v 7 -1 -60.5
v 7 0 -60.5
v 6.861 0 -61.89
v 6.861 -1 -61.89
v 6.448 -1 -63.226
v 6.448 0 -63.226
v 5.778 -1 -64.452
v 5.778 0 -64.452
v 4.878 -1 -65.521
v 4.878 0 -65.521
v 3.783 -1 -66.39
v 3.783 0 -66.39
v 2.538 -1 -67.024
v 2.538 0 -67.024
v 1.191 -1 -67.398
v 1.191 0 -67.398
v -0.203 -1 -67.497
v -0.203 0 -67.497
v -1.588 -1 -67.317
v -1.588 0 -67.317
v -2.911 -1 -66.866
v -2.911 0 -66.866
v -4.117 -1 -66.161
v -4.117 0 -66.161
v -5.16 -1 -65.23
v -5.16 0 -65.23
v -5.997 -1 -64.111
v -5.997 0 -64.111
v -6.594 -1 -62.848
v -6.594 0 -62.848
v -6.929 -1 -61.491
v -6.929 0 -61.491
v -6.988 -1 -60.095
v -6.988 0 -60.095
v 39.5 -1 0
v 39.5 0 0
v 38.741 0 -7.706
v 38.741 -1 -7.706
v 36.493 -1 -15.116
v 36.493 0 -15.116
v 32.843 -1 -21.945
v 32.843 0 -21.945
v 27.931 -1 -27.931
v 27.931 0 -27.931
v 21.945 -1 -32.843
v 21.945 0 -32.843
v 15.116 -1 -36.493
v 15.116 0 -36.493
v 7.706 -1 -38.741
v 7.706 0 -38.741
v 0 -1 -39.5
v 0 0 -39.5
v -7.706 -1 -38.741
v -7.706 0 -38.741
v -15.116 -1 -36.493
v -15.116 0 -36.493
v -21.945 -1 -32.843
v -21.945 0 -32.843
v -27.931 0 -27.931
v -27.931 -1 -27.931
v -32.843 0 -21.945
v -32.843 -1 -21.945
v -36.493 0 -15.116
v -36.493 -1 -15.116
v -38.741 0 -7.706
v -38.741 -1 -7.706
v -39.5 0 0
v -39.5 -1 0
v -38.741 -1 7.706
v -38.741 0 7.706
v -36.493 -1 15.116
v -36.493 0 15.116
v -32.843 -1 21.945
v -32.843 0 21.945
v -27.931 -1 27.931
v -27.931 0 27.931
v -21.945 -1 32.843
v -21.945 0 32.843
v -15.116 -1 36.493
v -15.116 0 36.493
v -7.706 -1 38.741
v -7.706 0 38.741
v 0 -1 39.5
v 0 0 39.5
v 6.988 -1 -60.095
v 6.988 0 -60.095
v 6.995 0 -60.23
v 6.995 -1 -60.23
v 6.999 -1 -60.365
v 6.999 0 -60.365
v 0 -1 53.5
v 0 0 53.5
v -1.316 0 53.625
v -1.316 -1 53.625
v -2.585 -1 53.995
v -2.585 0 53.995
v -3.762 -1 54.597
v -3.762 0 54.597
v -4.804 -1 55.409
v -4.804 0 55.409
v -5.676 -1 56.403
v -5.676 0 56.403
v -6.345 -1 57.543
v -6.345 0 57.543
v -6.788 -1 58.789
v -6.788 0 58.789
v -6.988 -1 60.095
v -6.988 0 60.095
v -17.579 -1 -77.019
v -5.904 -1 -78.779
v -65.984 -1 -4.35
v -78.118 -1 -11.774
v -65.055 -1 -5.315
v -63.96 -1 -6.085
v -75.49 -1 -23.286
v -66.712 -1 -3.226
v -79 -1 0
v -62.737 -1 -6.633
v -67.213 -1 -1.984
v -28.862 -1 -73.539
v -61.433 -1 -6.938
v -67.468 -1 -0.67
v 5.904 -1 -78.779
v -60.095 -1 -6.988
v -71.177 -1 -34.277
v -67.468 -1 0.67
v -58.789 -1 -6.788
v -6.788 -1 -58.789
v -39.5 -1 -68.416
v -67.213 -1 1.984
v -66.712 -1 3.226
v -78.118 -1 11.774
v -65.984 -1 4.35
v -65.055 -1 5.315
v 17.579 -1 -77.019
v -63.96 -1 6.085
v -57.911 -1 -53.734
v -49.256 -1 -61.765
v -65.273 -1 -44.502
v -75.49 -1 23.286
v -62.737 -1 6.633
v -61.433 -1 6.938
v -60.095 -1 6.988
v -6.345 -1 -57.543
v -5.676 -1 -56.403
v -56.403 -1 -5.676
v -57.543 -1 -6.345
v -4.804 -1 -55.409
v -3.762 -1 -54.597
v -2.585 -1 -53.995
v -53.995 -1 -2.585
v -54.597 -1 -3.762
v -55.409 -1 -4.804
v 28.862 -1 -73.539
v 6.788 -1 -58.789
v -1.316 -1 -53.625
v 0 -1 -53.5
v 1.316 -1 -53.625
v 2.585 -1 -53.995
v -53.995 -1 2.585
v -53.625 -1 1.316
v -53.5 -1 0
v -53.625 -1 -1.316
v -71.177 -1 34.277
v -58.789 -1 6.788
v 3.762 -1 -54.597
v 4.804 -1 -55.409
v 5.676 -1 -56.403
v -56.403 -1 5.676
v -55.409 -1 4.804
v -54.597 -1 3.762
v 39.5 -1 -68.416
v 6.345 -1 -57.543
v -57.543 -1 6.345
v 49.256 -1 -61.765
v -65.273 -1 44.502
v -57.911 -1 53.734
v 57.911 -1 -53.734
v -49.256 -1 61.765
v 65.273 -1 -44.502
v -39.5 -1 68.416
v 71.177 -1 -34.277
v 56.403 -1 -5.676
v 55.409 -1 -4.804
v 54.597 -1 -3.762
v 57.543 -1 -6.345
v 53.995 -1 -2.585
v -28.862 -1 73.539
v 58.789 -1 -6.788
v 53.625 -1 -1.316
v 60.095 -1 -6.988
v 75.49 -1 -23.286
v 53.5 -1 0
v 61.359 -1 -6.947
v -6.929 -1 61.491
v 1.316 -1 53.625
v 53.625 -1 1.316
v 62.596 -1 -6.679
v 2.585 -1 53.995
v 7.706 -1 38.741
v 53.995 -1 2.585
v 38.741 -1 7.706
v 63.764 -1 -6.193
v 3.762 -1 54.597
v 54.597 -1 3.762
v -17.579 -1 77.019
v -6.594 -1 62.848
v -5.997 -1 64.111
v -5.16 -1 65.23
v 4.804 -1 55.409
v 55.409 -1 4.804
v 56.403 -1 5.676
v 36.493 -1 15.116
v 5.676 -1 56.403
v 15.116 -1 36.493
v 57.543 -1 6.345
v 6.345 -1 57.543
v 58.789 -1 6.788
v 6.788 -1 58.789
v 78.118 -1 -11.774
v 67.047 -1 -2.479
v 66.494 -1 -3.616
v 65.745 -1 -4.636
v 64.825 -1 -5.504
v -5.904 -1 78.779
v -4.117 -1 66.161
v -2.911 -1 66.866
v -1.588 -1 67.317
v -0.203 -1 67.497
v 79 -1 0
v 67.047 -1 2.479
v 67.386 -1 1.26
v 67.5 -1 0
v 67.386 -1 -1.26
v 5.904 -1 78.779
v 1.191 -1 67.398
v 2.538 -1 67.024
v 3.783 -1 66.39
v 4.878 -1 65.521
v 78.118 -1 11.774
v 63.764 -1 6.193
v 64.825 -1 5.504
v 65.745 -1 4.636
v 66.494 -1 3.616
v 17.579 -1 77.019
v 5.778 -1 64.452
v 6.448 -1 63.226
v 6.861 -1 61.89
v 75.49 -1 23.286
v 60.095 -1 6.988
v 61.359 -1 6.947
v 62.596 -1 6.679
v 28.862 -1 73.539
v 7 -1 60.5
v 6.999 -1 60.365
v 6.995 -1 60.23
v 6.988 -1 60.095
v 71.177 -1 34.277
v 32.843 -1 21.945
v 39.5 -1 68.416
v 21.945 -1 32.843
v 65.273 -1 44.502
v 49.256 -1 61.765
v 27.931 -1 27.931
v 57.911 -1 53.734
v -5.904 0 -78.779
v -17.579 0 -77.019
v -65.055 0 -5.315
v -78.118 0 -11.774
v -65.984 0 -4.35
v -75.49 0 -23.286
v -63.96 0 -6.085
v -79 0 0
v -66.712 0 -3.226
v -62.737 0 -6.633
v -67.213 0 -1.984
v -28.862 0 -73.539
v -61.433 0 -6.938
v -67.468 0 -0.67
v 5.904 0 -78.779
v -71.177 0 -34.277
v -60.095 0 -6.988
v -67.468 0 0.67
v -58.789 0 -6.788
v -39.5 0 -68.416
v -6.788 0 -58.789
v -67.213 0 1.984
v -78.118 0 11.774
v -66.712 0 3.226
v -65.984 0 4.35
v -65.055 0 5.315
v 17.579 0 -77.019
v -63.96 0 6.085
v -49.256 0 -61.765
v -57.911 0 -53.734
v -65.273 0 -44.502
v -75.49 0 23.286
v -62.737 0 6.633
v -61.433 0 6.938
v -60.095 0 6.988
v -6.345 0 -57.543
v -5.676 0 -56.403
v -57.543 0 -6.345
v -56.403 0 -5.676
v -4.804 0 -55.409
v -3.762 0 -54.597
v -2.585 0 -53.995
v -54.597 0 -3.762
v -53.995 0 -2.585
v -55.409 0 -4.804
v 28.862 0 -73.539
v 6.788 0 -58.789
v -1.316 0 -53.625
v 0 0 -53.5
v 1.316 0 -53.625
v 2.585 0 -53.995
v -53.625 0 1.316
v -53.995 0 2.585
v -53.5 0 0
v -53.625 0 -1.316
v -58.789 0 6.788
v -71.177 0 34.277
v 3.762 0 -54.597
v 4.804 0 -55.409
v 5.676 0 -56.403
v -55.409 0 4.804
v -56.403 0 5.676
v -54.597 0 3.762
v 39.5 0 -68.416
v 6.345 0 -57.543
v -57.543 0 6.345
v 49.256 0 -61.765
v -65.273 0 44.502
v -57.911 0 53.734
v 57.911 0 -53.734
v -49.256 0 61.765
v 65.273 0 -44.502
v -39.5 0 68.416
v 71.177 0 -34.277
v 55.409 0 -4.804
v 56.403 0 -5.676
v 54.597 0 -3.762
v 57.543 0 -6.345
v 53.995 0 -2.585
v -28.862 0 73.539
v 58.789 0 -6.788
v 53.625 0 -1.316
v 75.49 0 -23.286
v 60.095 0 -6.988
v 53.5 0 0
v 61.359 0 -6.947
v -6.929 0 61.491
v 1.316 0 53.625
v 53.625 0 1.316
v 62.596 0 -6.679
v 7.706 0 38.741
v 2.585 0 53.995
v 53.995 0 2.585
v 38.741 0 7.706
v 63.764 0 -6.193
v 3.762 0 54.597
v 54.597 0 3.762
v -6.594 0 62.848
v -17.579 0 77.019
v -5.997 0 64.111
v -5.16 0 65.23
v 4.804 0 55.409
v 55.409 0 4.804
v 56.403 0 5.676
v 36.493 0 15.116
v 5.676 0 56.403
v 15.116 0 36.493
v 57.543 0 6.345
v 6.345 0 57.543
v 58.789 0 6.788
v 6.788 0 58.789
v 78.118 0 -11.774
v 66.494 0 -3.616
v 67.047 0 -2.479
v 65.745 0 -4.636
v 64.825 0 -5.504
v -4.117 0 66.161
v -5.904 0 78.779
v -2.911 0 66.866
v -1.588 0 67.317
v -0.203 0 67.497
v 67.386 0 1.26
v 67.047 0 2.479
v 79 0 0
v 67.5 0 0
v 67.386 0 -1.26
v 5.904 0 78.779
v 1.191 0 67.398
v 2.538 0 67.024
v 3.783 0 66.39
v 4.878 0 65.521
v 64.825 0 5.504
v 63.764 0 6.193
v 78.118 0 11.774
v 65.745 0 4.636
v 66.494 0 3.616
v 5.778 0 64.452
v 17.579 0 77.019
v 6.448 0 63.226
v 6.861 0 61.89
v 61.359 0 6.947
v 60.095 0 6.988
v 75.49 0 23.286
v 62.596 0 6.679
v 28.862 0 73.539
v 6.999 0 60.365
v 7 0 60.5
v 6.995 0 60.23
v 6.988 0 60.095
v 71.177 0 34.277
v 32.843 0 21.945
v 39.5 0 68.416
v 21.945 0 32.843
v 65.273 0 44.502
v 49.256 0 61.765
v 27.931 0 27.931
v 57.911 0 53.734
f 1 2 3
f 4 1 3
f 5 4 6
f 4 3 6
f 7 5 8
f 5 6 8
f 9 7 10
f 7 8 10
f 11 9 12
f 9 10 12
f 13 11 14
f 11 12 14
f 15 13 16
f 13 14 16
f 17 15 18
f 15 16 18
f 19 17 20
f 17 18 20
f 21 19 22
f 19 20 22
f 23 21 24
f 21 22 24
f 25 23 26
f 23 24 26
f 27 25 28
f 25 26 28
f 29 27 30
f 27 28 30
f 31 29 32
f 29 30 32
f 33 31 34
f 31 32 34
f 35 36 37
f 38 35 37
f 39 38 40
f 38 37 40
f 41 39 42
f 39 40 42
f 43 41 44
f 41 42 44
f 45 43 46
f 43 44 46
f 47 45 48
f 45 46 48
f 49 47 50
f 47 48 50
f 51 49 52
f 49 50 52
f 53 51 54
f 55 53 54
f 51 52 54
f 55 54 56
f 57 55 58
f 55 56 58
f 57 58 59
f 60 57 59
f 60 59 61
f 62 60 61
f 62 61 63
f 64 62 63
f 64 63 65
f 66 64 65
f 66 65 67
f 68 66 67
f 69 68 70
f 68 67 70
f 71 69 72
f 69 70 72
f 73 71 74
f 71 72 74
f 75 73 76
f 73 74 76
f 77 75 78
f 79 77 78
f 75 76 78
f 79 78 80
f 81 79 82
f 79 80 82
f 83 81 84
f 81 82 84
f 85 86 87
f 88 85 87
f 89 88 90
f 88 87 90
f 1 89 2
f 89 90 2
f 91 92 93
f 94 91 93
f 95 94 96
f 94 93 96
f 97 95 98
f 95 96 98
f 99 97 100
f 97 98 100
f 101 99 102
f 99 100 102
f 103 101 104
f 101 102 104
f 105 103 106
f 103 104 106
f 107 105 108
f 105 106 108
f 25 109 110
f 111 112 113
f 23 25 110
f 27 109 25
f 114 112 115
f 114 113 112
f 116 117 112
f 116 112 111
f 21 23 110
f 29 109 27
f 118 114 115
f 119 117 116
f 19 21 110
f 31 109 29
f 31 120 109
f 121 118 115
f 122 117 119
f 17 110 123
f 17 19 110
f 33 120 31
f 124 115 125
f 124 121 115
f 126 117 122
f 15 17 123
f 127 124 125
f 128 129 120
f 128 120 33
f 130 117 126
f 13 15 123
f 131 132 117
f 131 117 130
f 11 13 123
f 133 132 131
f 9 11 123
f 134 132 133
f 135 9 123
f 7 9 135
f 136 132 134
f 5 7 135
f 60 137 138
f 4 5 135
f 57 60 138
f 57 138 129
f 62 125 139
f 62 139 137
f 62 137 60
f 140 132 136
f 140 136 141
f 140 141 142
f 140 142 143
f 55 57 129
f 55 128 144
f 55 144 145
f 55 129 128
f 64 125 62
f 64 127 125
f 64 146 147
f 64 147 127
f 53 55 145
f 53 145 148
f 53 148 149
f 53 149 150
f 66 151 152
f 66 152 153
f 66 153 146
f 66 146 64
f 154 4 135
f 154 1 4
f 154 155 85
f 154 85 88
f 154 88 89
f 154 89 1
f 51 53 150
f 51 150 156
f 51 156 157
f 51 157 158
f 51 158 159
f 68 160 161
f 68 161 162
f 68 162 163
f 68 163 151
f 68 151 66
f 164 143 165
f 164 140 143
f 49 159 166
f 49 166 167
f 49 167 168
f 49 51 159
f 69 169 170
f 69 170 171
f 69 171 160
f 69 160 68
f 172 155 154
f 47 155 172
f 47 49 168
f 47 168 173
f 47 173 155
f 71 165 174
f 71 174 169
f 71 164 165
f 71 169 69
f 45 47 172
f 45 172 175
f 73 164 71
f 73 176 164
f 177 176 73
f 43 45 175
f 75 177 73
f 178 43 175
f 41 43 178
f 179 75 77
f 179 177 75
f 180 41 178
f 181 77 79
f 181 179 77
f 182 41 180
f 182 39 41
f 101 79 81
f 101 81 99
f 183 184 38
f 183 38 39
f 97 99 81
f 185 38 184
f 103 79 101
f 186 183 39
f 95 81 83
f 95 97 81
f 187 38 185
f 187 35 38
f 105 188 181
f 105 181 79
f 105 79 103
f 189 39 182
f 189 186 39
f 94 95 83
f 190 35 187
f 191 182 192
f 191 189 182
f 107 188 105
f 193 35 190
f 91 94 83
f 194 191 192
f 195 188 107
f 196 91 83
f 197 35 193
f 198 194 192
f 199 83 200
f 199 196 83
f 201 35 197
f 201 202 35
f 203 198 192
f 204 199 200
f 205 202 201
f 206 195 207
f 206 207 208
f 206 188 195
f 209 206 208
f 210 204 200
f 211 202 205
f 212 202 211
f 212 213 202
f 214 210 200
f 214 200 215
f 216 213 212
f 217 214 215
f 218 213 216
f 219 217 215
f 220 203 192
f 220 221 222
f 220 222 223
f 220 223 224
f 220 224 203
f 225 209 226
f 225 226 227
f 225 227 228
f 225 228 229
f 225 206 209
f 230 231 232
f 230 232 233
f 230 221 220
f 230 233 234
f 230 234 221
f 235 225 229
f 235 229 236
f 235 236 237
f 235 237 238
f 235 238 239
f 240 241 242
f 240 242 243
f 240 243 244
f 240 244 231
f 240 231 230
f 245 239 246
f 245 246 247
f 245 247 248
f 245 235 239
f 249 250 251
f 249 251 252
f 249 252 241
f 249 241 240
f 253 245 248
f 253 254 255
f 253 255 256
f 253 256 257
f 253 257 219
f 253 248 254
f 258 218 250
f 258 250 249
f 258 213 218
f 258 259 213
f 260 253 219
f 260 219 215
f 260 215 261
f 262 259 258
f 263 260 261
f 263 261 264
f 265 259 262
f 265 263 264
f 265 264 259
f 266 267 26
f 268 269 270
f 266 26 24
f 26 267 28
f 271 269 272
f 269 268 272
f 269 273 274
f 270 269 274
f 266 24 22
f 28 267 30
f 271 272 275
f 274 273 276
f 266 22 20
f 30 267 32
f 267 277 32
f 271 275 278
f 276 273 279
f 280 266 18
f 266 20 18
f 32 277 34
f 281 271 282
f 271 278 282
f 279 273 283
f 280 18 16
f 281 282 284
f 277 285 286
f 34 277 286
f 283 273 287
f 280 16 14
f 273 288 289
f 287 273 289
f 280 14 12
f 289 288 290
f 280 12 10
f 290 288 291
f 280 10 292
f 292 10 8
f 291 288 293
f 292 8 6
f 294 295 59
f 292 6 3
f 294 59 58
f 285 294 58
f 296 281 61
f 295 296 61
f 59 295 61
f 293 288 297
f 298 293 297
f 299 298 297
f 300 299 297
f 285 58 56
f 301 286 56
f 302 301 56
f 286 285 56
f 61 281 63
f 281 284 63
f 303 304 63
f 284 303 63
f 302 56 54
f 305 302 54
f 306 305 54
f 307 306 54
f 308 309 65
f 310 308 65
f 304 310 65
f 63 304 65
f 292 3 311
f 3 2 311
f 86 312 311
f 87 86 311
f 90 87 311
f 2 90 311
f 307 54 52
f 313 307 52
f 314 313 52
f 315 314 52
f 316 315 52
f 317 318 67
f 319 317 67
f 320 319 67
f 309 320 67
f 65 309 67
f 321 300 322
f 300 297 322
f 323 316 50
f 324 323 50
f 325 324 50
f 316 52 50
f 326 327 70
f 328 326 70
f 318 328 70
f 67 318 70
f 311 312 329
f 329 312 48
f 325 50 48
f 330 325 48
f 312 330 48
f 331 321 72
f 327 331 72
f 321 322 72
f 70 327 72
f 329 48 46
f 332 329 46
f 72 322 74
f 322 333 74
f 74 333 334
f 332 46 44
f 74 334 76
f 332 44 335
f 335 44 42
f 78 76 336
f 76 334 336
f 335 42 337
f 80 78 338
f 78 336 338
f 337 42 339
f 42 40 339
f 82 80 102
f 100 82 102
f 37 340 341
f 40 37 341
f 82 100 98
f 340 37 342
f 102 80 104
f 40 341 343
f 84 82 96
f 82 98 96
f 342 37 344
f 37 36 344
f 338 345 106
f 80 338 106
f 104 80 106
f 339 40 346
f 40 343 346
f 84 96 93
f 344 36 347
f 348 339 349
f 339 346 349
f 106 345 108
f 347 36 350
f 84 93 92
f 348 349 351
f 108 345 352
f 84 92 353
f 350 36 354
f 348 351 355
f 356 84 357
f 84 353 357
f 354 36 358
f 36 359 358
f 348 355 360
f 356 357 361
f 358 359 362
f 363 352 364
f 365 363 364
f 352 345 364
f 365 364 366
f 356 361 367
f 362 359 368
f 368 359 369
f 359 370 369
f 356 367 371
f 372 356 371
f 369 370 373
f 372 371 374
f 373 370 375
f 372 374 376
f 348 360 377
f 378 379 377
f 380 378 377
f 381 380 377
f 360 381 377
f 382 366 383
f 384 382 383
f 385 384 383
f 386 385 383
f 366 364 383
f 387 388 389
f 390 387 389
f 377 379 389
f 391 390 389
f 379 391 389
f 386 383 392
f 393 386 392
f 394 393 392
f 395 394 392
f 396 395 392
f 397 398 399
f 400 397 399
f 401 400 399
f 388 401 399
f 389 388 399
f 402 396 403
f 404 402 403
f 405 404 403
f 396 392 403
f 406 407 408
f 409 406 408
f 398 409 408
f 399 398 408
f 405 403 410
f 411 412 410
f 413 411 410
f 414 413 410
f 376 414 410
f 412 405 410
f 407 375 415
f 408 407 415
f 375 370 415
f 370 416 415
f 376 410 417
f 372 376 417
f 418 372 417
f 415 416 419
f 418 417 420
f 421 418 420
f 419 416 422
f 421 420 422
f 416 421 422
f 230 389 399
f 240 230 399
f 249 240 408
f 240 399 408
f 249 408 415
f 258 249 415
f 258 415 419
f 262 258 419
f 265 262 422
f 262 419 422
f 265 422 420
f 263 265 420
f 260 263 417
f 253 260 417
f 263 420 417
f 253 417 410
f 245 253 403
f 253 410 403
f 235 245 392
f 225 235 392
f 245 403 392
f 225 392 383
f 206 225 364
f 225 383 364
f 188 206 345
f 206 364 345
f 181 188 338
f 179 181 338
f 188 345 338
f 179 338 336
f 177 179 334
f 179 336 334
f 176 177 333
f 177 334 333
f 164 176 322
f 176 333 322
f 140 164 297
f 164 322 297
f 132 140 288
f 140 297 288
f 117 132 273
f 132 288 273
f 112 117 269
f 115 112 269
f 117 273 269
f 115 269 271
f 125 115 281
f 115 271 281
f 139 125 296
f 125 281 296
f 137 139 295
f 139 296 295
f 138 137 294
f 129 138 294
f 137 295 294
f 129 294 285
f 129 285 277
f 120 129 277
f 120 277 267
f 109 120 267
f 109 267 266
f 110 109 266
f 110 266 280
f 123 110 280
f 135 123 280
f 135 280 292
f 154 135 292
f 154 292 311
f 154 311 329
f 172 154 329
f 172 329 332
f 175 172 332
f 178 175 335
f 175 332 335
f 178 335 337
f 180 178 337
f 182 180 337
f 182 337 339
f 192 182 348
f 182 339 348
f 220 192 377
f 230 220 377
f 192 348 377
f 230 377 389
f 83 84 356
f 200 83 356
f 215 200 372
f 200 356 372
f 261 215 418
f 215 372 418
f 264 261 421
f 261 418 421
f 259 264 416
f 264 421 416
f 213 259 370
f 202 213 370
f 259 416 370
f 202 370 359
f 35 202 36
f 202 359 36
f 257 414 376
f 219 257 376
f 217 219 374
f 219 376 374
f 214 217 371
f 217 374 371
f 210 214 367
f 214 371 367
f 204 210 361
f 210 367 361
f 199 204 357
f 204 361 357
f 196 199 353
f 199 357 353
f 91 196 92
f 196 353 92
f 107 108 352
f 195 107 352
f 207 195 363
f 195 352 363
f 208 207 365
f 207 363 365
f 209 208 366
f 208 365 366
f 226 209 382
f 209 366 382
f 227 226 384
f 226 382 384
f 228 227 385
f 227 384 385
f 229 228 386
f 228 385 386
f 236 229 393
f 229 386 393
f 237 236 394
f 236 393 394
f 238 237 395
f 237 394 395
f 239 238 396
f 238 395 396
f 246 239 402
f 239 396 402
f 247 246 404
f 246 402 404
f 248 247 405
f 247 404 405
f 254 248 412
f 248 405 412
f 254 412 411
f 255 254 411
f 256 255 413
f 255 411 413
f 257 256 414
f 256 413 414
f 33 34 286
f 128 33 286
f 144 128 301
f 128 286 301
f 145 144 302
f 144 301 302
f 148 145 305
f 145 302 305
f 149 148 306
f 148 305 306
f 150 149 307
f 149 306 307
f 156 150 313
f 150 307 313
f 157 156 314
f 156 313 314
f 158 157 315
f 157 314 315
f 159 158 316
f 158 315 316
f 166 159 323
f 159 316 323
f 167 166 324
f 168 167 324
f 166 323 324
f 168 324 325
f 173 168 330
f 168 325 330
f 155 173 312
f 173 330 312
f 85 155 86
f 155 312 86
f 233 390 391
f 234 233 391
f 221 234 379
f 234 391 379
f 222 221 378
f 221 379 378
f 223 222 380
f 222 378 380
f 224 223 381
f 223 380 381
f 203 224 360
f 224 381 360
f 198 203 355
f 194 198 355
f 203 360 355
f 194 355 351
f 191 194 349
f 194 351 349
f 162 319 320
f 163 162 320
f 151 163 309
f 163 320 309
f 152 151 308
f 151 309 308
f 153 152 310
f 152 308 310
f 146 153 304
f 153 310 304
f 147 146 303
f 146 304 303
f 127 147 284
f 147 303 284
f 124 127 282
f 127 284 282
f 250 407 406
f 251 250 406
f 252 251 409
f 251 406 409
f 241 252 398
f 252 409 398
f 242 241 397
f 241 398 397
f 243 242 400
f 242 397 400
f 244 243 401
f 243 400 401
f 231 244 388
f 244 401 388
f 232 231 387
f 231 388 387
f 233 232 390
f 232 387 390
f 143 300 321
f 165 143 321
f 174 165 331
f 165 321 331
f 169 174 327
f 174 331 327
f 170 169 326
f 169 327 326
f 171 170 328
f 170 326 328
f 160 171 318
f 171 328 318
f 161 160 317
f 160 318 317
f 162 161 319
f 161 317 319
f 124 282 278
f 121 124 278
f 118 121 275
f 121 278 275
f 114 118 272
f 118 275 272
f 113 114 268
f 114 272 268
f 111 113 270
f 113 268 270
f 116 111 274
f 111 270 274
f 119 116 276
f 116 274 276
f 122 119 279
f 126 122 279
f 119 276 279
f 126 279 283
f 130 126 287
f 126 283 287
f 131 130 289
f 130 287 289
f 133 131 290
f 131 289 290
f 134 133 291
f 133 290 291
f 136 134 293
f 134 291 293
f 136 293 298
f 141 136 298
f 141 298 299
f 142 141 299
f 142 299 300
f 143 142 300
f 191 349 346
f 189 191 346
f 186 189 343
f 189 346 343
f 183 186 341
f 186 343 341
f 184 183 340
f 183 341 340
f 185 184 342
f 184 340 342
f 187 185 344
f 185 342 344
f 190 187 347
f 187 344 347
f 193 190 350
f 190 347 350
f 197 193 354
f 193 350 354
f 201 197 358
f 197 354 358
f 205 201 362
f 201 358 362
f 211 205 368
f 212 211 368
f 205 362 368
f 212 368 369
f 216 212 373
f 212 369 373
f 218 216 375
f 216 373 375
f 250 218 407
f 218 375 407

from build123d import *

# Parameters (mm, degrees)
F0_R     = 79
F1_DEPTH = 1


with BuildPart() as f1:
    # F0 (on Front) → F1 (new body)
    with BuildSketch(Plane.XZ):
        Circle(F0_R)
        with BuildLine():
            ThreePointArc((6.9882765021, 60.0950413223), (42.7799602618, 42.7799602618), (60.0950413223, 6.9882765021))
            ThreePointArc((60.0950413223, 6.9882765021), (65.3044400952, 5.0909090909), (67.5, 0))
            ThreePointArc((67.5, 0), (65.3044400952, -5.0909090909), (60.0950413223, -6.9882765021))
            ThreePointArc((60.0950413223, -6.9882765021), (42.7799602618, -42.7799602618), (6.9882765021, -60.0950413223))
            ThreePointArc((6.9882765021, -60.0950413223), (6.9970685117, -60.2974358305), (7, -60.5))
            ThreePointArc((7, -60.5), (-0.2025641695, -67.4970685117), (-6.9882765021, -60.0950413223))
            ThreePointArc((-6.9882765021, -60.0950413223), (-42.7799602618, -42.7799602618), (-60.0950413223, -6.9882765021))
            ThreePointArc((-60.0950413223, -6.9882765021), (-67.5, 0), (-60.0950413223, 6.9882765021))
            ThreePointArc((-60.0950413223, 6.9882765021), (-42.7799602618, 42.7799602618), (-6.9882765021, 60.0950413223))
            ThreePointArc((-6.9882765021, 60.0950413223), (-0.2025641695, 67.4970685117), (7, 60.5))
            ThreePointArc((7, 60.5), (6.9970685117, 60.2974358305), (6.9882765021, 60.0950413223))
        make_face(mode=Mode.SUBTRACT)
        with BuildLine():
            ThreePointArc((60.0950413223, -6.9882765021), (53.5, 0), (60.0950413223, 6.9882765021))
            ThreePointArc((60.0950413223, 6.9882765021), (42.7799602618, 42.7799602618), (6.9882765021, 60.0950413223))
            ThreePointArc((6.9882765021, 60.0950413223), (4.8044400952, 55.4090909091), (0, 53.5))
            ThreePointArc((0, 53.5), (-4.8044400952, 55.4090909091), (-6.9882765021, 60.0950413223))
            ThreePointArc((-6.9882765021, 60.0950413223), (-42.7799602618, 42.7799602618), (-60.0950413223, 6.9882765021))
            ThreePointArc((-60.0950413223, 6.9882765021), (-55.4090909091, 4.8044400952), (-53.5, 0))
            ThreePointArc((-53.5, 0), (-55.4090909091, -4.8044400952), (-60.0950413223, -6.9882765021))
            ThreePointArc((-60.0950413223, -6.9882765021), (-42.7799602618, -42.7799602618), (-6.9882765021, -60.0950413223))
            ThreePointArc((-6.9882765021, -60.0950413223), (0, -53.5), (6.9882765021, -60.0950413223))
            ThreePointArc((6.9882765021, -60.0950413223), (42.7799602618, -42.7799602618), (60.0950413223, -6.9882765021))
        make_face()
        with BuildLine():
            ThreePointArc((39.5, 0), (-27.9307178569, -27.9307178569), (0, 39.5))
            ThreePointArc((0, 39.5), (27.9307178569, 27.9307178569), (39.5, 0))
        make_face(mode=Mode.SUBTRACT)
    extrude(amount=F1_DEPTH)


solid = f1.part
